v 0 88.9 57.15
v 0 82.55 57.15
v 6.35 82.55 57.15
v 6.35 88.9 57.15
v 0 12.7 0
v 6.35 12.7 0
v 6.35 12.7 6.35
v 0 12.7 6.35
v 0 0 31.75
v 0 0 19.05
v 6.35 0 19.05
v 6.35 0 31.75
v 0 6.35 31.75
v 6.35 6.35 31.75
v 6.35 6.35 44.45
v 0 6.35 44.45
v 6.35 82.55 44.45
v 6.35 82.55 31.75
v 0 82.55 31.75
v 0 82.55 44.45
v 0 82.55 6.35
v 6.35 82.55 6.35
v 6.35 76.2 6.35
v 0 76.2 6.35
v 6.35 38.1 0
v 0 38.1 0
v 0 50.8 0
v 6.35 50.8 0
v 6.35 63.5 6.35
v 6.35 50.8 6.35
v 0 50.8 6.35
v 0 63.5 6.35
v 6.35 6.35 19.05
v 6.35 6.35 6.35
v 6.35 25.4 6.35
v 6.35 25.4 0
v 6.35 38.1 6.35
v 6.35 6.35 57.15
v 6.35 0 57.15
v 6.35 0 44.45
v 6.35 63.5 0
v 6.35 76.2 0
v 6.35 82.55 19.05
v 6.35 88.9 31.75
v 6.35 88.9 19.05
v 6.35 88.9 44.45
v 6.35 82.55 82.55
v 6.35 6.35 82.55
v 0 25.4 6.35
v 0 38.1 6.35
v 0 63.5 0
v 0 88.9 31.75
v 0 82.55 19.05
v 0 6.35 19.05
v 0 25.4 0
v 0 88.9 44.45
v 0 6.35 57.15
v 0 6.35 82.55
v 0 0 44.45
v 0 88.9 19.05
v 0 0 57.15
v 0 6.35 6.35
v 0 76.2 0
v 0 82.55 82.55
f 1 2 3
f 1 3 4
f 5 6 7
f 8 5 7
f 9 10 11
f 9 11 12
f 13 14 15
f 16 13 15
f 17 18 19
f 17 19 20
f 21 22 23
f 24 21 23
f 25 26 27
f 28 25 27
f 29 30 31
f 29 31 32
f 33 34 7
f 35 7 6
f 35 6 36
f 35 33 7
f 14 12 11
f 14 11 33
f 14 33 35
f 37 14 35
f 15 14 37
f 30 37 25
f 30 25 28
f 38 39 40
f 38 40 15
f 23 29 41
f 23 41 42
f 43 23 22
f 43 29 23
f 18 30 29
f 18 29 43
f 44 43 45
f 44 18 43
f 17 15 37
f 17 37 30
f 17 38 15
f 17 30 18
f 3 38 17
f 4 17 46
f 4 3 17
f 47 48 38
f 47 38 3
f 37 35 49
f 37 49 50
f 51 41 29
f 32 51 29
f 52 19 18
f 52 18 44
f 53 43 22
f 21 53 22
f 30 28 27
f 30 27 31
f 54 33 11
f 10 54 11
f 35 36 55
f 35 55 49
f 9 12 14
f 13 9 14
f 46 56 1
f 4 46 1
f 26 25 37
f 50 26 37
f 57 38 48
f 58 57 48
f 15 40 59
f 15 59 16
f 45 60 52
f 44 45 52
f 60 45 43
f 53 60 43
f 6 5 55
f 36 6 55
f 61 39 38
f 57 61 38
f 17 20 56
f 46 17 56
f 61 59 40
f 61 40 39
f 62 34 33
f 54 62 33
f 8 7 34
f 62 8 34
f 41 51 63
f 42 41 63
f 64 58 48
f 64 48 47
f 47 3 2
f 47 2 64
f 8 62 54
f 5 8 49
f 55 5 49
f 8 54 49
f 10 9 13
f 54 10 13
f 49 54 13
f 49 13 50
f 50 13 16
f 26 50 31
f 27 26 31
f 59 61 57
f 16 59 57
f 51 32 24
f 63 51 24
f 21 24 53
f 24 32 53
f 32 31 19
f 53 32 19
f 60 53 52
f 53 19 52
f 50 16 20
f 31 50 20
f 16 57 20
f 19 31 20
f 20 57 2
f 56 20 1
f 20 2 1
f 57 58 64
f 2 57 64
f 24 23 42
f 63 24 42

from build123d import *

# Parameters (mm, degrees)
SKETCH1_W           = 88.9
SKETCH1_H           = 82.55
BOSS_EXTRUDE1_DEPTH = 6.35
SKETCH2_W           = 12.7
SKETCH2_H           = 6.35
SKETCH2_W_2         = 6.35
SKETCH2_H_2         = 25.4
SKETCH2_H_3         = 12.7
CUT_EXTRUDE2_DEPTH  = 6.35


with BuildPart() as part:
    # Sketch1 → Boss-Extrude1 (new body)
    with BuildSketch(Plane.YZ):
        with Locations((44.45, 41.275)):
            Rectangle(SKETCH1_W, SKETCH1_H)
    extrude(amount=BOSS_EXTRUDE1_DEPTH)

    # Sketch2 → Cut-Extrude2 (cut)
    with BuildSketch(Plane.YZ.offset(6.35)):
        with Locations((57.15, 3.175)):
            Rectangle(SKETCH2_W, SKETCH2_H)
        with Locations((31.75, 3.175)):
            Rectangle(SKETCH2_W, SKETCH2_H)
        Polygon((0, 0), (12.7, 0), (12.7, 6.35), (6.35, 6.35), (6.35, 19.05), (0, 19.05), (0, 6.35), align=None)
        Polygon((76.2, 0), (88.9, 0), (88.9, 6.35), (88.9, 19.05), (82.55, 19.05), (82.55, 6.35), (76.2, 6.35), align=None)
        with Locations((3.175, 69.85)):
            Rectangle(SKETCH2_W_2, SKETCH2_H_2)
        with Locations((3.175, 38.1)):
            Rectangle(SKETCH2_W_2, SKETCH2_H_3)
        with Locations((85.725, 38.1)):
            Rectangle(SKETCH2_W_2, SKETCH2_H_3)
        with Locations((85.725, 69.85)):
            Rectangle(SKETCH2_W_2, SKETCH2_H_2)
    extrude(amount=-CUT_EXTRUDE2_DEPTH, mode=Mode.SUBTRACT)


solid = part.part
